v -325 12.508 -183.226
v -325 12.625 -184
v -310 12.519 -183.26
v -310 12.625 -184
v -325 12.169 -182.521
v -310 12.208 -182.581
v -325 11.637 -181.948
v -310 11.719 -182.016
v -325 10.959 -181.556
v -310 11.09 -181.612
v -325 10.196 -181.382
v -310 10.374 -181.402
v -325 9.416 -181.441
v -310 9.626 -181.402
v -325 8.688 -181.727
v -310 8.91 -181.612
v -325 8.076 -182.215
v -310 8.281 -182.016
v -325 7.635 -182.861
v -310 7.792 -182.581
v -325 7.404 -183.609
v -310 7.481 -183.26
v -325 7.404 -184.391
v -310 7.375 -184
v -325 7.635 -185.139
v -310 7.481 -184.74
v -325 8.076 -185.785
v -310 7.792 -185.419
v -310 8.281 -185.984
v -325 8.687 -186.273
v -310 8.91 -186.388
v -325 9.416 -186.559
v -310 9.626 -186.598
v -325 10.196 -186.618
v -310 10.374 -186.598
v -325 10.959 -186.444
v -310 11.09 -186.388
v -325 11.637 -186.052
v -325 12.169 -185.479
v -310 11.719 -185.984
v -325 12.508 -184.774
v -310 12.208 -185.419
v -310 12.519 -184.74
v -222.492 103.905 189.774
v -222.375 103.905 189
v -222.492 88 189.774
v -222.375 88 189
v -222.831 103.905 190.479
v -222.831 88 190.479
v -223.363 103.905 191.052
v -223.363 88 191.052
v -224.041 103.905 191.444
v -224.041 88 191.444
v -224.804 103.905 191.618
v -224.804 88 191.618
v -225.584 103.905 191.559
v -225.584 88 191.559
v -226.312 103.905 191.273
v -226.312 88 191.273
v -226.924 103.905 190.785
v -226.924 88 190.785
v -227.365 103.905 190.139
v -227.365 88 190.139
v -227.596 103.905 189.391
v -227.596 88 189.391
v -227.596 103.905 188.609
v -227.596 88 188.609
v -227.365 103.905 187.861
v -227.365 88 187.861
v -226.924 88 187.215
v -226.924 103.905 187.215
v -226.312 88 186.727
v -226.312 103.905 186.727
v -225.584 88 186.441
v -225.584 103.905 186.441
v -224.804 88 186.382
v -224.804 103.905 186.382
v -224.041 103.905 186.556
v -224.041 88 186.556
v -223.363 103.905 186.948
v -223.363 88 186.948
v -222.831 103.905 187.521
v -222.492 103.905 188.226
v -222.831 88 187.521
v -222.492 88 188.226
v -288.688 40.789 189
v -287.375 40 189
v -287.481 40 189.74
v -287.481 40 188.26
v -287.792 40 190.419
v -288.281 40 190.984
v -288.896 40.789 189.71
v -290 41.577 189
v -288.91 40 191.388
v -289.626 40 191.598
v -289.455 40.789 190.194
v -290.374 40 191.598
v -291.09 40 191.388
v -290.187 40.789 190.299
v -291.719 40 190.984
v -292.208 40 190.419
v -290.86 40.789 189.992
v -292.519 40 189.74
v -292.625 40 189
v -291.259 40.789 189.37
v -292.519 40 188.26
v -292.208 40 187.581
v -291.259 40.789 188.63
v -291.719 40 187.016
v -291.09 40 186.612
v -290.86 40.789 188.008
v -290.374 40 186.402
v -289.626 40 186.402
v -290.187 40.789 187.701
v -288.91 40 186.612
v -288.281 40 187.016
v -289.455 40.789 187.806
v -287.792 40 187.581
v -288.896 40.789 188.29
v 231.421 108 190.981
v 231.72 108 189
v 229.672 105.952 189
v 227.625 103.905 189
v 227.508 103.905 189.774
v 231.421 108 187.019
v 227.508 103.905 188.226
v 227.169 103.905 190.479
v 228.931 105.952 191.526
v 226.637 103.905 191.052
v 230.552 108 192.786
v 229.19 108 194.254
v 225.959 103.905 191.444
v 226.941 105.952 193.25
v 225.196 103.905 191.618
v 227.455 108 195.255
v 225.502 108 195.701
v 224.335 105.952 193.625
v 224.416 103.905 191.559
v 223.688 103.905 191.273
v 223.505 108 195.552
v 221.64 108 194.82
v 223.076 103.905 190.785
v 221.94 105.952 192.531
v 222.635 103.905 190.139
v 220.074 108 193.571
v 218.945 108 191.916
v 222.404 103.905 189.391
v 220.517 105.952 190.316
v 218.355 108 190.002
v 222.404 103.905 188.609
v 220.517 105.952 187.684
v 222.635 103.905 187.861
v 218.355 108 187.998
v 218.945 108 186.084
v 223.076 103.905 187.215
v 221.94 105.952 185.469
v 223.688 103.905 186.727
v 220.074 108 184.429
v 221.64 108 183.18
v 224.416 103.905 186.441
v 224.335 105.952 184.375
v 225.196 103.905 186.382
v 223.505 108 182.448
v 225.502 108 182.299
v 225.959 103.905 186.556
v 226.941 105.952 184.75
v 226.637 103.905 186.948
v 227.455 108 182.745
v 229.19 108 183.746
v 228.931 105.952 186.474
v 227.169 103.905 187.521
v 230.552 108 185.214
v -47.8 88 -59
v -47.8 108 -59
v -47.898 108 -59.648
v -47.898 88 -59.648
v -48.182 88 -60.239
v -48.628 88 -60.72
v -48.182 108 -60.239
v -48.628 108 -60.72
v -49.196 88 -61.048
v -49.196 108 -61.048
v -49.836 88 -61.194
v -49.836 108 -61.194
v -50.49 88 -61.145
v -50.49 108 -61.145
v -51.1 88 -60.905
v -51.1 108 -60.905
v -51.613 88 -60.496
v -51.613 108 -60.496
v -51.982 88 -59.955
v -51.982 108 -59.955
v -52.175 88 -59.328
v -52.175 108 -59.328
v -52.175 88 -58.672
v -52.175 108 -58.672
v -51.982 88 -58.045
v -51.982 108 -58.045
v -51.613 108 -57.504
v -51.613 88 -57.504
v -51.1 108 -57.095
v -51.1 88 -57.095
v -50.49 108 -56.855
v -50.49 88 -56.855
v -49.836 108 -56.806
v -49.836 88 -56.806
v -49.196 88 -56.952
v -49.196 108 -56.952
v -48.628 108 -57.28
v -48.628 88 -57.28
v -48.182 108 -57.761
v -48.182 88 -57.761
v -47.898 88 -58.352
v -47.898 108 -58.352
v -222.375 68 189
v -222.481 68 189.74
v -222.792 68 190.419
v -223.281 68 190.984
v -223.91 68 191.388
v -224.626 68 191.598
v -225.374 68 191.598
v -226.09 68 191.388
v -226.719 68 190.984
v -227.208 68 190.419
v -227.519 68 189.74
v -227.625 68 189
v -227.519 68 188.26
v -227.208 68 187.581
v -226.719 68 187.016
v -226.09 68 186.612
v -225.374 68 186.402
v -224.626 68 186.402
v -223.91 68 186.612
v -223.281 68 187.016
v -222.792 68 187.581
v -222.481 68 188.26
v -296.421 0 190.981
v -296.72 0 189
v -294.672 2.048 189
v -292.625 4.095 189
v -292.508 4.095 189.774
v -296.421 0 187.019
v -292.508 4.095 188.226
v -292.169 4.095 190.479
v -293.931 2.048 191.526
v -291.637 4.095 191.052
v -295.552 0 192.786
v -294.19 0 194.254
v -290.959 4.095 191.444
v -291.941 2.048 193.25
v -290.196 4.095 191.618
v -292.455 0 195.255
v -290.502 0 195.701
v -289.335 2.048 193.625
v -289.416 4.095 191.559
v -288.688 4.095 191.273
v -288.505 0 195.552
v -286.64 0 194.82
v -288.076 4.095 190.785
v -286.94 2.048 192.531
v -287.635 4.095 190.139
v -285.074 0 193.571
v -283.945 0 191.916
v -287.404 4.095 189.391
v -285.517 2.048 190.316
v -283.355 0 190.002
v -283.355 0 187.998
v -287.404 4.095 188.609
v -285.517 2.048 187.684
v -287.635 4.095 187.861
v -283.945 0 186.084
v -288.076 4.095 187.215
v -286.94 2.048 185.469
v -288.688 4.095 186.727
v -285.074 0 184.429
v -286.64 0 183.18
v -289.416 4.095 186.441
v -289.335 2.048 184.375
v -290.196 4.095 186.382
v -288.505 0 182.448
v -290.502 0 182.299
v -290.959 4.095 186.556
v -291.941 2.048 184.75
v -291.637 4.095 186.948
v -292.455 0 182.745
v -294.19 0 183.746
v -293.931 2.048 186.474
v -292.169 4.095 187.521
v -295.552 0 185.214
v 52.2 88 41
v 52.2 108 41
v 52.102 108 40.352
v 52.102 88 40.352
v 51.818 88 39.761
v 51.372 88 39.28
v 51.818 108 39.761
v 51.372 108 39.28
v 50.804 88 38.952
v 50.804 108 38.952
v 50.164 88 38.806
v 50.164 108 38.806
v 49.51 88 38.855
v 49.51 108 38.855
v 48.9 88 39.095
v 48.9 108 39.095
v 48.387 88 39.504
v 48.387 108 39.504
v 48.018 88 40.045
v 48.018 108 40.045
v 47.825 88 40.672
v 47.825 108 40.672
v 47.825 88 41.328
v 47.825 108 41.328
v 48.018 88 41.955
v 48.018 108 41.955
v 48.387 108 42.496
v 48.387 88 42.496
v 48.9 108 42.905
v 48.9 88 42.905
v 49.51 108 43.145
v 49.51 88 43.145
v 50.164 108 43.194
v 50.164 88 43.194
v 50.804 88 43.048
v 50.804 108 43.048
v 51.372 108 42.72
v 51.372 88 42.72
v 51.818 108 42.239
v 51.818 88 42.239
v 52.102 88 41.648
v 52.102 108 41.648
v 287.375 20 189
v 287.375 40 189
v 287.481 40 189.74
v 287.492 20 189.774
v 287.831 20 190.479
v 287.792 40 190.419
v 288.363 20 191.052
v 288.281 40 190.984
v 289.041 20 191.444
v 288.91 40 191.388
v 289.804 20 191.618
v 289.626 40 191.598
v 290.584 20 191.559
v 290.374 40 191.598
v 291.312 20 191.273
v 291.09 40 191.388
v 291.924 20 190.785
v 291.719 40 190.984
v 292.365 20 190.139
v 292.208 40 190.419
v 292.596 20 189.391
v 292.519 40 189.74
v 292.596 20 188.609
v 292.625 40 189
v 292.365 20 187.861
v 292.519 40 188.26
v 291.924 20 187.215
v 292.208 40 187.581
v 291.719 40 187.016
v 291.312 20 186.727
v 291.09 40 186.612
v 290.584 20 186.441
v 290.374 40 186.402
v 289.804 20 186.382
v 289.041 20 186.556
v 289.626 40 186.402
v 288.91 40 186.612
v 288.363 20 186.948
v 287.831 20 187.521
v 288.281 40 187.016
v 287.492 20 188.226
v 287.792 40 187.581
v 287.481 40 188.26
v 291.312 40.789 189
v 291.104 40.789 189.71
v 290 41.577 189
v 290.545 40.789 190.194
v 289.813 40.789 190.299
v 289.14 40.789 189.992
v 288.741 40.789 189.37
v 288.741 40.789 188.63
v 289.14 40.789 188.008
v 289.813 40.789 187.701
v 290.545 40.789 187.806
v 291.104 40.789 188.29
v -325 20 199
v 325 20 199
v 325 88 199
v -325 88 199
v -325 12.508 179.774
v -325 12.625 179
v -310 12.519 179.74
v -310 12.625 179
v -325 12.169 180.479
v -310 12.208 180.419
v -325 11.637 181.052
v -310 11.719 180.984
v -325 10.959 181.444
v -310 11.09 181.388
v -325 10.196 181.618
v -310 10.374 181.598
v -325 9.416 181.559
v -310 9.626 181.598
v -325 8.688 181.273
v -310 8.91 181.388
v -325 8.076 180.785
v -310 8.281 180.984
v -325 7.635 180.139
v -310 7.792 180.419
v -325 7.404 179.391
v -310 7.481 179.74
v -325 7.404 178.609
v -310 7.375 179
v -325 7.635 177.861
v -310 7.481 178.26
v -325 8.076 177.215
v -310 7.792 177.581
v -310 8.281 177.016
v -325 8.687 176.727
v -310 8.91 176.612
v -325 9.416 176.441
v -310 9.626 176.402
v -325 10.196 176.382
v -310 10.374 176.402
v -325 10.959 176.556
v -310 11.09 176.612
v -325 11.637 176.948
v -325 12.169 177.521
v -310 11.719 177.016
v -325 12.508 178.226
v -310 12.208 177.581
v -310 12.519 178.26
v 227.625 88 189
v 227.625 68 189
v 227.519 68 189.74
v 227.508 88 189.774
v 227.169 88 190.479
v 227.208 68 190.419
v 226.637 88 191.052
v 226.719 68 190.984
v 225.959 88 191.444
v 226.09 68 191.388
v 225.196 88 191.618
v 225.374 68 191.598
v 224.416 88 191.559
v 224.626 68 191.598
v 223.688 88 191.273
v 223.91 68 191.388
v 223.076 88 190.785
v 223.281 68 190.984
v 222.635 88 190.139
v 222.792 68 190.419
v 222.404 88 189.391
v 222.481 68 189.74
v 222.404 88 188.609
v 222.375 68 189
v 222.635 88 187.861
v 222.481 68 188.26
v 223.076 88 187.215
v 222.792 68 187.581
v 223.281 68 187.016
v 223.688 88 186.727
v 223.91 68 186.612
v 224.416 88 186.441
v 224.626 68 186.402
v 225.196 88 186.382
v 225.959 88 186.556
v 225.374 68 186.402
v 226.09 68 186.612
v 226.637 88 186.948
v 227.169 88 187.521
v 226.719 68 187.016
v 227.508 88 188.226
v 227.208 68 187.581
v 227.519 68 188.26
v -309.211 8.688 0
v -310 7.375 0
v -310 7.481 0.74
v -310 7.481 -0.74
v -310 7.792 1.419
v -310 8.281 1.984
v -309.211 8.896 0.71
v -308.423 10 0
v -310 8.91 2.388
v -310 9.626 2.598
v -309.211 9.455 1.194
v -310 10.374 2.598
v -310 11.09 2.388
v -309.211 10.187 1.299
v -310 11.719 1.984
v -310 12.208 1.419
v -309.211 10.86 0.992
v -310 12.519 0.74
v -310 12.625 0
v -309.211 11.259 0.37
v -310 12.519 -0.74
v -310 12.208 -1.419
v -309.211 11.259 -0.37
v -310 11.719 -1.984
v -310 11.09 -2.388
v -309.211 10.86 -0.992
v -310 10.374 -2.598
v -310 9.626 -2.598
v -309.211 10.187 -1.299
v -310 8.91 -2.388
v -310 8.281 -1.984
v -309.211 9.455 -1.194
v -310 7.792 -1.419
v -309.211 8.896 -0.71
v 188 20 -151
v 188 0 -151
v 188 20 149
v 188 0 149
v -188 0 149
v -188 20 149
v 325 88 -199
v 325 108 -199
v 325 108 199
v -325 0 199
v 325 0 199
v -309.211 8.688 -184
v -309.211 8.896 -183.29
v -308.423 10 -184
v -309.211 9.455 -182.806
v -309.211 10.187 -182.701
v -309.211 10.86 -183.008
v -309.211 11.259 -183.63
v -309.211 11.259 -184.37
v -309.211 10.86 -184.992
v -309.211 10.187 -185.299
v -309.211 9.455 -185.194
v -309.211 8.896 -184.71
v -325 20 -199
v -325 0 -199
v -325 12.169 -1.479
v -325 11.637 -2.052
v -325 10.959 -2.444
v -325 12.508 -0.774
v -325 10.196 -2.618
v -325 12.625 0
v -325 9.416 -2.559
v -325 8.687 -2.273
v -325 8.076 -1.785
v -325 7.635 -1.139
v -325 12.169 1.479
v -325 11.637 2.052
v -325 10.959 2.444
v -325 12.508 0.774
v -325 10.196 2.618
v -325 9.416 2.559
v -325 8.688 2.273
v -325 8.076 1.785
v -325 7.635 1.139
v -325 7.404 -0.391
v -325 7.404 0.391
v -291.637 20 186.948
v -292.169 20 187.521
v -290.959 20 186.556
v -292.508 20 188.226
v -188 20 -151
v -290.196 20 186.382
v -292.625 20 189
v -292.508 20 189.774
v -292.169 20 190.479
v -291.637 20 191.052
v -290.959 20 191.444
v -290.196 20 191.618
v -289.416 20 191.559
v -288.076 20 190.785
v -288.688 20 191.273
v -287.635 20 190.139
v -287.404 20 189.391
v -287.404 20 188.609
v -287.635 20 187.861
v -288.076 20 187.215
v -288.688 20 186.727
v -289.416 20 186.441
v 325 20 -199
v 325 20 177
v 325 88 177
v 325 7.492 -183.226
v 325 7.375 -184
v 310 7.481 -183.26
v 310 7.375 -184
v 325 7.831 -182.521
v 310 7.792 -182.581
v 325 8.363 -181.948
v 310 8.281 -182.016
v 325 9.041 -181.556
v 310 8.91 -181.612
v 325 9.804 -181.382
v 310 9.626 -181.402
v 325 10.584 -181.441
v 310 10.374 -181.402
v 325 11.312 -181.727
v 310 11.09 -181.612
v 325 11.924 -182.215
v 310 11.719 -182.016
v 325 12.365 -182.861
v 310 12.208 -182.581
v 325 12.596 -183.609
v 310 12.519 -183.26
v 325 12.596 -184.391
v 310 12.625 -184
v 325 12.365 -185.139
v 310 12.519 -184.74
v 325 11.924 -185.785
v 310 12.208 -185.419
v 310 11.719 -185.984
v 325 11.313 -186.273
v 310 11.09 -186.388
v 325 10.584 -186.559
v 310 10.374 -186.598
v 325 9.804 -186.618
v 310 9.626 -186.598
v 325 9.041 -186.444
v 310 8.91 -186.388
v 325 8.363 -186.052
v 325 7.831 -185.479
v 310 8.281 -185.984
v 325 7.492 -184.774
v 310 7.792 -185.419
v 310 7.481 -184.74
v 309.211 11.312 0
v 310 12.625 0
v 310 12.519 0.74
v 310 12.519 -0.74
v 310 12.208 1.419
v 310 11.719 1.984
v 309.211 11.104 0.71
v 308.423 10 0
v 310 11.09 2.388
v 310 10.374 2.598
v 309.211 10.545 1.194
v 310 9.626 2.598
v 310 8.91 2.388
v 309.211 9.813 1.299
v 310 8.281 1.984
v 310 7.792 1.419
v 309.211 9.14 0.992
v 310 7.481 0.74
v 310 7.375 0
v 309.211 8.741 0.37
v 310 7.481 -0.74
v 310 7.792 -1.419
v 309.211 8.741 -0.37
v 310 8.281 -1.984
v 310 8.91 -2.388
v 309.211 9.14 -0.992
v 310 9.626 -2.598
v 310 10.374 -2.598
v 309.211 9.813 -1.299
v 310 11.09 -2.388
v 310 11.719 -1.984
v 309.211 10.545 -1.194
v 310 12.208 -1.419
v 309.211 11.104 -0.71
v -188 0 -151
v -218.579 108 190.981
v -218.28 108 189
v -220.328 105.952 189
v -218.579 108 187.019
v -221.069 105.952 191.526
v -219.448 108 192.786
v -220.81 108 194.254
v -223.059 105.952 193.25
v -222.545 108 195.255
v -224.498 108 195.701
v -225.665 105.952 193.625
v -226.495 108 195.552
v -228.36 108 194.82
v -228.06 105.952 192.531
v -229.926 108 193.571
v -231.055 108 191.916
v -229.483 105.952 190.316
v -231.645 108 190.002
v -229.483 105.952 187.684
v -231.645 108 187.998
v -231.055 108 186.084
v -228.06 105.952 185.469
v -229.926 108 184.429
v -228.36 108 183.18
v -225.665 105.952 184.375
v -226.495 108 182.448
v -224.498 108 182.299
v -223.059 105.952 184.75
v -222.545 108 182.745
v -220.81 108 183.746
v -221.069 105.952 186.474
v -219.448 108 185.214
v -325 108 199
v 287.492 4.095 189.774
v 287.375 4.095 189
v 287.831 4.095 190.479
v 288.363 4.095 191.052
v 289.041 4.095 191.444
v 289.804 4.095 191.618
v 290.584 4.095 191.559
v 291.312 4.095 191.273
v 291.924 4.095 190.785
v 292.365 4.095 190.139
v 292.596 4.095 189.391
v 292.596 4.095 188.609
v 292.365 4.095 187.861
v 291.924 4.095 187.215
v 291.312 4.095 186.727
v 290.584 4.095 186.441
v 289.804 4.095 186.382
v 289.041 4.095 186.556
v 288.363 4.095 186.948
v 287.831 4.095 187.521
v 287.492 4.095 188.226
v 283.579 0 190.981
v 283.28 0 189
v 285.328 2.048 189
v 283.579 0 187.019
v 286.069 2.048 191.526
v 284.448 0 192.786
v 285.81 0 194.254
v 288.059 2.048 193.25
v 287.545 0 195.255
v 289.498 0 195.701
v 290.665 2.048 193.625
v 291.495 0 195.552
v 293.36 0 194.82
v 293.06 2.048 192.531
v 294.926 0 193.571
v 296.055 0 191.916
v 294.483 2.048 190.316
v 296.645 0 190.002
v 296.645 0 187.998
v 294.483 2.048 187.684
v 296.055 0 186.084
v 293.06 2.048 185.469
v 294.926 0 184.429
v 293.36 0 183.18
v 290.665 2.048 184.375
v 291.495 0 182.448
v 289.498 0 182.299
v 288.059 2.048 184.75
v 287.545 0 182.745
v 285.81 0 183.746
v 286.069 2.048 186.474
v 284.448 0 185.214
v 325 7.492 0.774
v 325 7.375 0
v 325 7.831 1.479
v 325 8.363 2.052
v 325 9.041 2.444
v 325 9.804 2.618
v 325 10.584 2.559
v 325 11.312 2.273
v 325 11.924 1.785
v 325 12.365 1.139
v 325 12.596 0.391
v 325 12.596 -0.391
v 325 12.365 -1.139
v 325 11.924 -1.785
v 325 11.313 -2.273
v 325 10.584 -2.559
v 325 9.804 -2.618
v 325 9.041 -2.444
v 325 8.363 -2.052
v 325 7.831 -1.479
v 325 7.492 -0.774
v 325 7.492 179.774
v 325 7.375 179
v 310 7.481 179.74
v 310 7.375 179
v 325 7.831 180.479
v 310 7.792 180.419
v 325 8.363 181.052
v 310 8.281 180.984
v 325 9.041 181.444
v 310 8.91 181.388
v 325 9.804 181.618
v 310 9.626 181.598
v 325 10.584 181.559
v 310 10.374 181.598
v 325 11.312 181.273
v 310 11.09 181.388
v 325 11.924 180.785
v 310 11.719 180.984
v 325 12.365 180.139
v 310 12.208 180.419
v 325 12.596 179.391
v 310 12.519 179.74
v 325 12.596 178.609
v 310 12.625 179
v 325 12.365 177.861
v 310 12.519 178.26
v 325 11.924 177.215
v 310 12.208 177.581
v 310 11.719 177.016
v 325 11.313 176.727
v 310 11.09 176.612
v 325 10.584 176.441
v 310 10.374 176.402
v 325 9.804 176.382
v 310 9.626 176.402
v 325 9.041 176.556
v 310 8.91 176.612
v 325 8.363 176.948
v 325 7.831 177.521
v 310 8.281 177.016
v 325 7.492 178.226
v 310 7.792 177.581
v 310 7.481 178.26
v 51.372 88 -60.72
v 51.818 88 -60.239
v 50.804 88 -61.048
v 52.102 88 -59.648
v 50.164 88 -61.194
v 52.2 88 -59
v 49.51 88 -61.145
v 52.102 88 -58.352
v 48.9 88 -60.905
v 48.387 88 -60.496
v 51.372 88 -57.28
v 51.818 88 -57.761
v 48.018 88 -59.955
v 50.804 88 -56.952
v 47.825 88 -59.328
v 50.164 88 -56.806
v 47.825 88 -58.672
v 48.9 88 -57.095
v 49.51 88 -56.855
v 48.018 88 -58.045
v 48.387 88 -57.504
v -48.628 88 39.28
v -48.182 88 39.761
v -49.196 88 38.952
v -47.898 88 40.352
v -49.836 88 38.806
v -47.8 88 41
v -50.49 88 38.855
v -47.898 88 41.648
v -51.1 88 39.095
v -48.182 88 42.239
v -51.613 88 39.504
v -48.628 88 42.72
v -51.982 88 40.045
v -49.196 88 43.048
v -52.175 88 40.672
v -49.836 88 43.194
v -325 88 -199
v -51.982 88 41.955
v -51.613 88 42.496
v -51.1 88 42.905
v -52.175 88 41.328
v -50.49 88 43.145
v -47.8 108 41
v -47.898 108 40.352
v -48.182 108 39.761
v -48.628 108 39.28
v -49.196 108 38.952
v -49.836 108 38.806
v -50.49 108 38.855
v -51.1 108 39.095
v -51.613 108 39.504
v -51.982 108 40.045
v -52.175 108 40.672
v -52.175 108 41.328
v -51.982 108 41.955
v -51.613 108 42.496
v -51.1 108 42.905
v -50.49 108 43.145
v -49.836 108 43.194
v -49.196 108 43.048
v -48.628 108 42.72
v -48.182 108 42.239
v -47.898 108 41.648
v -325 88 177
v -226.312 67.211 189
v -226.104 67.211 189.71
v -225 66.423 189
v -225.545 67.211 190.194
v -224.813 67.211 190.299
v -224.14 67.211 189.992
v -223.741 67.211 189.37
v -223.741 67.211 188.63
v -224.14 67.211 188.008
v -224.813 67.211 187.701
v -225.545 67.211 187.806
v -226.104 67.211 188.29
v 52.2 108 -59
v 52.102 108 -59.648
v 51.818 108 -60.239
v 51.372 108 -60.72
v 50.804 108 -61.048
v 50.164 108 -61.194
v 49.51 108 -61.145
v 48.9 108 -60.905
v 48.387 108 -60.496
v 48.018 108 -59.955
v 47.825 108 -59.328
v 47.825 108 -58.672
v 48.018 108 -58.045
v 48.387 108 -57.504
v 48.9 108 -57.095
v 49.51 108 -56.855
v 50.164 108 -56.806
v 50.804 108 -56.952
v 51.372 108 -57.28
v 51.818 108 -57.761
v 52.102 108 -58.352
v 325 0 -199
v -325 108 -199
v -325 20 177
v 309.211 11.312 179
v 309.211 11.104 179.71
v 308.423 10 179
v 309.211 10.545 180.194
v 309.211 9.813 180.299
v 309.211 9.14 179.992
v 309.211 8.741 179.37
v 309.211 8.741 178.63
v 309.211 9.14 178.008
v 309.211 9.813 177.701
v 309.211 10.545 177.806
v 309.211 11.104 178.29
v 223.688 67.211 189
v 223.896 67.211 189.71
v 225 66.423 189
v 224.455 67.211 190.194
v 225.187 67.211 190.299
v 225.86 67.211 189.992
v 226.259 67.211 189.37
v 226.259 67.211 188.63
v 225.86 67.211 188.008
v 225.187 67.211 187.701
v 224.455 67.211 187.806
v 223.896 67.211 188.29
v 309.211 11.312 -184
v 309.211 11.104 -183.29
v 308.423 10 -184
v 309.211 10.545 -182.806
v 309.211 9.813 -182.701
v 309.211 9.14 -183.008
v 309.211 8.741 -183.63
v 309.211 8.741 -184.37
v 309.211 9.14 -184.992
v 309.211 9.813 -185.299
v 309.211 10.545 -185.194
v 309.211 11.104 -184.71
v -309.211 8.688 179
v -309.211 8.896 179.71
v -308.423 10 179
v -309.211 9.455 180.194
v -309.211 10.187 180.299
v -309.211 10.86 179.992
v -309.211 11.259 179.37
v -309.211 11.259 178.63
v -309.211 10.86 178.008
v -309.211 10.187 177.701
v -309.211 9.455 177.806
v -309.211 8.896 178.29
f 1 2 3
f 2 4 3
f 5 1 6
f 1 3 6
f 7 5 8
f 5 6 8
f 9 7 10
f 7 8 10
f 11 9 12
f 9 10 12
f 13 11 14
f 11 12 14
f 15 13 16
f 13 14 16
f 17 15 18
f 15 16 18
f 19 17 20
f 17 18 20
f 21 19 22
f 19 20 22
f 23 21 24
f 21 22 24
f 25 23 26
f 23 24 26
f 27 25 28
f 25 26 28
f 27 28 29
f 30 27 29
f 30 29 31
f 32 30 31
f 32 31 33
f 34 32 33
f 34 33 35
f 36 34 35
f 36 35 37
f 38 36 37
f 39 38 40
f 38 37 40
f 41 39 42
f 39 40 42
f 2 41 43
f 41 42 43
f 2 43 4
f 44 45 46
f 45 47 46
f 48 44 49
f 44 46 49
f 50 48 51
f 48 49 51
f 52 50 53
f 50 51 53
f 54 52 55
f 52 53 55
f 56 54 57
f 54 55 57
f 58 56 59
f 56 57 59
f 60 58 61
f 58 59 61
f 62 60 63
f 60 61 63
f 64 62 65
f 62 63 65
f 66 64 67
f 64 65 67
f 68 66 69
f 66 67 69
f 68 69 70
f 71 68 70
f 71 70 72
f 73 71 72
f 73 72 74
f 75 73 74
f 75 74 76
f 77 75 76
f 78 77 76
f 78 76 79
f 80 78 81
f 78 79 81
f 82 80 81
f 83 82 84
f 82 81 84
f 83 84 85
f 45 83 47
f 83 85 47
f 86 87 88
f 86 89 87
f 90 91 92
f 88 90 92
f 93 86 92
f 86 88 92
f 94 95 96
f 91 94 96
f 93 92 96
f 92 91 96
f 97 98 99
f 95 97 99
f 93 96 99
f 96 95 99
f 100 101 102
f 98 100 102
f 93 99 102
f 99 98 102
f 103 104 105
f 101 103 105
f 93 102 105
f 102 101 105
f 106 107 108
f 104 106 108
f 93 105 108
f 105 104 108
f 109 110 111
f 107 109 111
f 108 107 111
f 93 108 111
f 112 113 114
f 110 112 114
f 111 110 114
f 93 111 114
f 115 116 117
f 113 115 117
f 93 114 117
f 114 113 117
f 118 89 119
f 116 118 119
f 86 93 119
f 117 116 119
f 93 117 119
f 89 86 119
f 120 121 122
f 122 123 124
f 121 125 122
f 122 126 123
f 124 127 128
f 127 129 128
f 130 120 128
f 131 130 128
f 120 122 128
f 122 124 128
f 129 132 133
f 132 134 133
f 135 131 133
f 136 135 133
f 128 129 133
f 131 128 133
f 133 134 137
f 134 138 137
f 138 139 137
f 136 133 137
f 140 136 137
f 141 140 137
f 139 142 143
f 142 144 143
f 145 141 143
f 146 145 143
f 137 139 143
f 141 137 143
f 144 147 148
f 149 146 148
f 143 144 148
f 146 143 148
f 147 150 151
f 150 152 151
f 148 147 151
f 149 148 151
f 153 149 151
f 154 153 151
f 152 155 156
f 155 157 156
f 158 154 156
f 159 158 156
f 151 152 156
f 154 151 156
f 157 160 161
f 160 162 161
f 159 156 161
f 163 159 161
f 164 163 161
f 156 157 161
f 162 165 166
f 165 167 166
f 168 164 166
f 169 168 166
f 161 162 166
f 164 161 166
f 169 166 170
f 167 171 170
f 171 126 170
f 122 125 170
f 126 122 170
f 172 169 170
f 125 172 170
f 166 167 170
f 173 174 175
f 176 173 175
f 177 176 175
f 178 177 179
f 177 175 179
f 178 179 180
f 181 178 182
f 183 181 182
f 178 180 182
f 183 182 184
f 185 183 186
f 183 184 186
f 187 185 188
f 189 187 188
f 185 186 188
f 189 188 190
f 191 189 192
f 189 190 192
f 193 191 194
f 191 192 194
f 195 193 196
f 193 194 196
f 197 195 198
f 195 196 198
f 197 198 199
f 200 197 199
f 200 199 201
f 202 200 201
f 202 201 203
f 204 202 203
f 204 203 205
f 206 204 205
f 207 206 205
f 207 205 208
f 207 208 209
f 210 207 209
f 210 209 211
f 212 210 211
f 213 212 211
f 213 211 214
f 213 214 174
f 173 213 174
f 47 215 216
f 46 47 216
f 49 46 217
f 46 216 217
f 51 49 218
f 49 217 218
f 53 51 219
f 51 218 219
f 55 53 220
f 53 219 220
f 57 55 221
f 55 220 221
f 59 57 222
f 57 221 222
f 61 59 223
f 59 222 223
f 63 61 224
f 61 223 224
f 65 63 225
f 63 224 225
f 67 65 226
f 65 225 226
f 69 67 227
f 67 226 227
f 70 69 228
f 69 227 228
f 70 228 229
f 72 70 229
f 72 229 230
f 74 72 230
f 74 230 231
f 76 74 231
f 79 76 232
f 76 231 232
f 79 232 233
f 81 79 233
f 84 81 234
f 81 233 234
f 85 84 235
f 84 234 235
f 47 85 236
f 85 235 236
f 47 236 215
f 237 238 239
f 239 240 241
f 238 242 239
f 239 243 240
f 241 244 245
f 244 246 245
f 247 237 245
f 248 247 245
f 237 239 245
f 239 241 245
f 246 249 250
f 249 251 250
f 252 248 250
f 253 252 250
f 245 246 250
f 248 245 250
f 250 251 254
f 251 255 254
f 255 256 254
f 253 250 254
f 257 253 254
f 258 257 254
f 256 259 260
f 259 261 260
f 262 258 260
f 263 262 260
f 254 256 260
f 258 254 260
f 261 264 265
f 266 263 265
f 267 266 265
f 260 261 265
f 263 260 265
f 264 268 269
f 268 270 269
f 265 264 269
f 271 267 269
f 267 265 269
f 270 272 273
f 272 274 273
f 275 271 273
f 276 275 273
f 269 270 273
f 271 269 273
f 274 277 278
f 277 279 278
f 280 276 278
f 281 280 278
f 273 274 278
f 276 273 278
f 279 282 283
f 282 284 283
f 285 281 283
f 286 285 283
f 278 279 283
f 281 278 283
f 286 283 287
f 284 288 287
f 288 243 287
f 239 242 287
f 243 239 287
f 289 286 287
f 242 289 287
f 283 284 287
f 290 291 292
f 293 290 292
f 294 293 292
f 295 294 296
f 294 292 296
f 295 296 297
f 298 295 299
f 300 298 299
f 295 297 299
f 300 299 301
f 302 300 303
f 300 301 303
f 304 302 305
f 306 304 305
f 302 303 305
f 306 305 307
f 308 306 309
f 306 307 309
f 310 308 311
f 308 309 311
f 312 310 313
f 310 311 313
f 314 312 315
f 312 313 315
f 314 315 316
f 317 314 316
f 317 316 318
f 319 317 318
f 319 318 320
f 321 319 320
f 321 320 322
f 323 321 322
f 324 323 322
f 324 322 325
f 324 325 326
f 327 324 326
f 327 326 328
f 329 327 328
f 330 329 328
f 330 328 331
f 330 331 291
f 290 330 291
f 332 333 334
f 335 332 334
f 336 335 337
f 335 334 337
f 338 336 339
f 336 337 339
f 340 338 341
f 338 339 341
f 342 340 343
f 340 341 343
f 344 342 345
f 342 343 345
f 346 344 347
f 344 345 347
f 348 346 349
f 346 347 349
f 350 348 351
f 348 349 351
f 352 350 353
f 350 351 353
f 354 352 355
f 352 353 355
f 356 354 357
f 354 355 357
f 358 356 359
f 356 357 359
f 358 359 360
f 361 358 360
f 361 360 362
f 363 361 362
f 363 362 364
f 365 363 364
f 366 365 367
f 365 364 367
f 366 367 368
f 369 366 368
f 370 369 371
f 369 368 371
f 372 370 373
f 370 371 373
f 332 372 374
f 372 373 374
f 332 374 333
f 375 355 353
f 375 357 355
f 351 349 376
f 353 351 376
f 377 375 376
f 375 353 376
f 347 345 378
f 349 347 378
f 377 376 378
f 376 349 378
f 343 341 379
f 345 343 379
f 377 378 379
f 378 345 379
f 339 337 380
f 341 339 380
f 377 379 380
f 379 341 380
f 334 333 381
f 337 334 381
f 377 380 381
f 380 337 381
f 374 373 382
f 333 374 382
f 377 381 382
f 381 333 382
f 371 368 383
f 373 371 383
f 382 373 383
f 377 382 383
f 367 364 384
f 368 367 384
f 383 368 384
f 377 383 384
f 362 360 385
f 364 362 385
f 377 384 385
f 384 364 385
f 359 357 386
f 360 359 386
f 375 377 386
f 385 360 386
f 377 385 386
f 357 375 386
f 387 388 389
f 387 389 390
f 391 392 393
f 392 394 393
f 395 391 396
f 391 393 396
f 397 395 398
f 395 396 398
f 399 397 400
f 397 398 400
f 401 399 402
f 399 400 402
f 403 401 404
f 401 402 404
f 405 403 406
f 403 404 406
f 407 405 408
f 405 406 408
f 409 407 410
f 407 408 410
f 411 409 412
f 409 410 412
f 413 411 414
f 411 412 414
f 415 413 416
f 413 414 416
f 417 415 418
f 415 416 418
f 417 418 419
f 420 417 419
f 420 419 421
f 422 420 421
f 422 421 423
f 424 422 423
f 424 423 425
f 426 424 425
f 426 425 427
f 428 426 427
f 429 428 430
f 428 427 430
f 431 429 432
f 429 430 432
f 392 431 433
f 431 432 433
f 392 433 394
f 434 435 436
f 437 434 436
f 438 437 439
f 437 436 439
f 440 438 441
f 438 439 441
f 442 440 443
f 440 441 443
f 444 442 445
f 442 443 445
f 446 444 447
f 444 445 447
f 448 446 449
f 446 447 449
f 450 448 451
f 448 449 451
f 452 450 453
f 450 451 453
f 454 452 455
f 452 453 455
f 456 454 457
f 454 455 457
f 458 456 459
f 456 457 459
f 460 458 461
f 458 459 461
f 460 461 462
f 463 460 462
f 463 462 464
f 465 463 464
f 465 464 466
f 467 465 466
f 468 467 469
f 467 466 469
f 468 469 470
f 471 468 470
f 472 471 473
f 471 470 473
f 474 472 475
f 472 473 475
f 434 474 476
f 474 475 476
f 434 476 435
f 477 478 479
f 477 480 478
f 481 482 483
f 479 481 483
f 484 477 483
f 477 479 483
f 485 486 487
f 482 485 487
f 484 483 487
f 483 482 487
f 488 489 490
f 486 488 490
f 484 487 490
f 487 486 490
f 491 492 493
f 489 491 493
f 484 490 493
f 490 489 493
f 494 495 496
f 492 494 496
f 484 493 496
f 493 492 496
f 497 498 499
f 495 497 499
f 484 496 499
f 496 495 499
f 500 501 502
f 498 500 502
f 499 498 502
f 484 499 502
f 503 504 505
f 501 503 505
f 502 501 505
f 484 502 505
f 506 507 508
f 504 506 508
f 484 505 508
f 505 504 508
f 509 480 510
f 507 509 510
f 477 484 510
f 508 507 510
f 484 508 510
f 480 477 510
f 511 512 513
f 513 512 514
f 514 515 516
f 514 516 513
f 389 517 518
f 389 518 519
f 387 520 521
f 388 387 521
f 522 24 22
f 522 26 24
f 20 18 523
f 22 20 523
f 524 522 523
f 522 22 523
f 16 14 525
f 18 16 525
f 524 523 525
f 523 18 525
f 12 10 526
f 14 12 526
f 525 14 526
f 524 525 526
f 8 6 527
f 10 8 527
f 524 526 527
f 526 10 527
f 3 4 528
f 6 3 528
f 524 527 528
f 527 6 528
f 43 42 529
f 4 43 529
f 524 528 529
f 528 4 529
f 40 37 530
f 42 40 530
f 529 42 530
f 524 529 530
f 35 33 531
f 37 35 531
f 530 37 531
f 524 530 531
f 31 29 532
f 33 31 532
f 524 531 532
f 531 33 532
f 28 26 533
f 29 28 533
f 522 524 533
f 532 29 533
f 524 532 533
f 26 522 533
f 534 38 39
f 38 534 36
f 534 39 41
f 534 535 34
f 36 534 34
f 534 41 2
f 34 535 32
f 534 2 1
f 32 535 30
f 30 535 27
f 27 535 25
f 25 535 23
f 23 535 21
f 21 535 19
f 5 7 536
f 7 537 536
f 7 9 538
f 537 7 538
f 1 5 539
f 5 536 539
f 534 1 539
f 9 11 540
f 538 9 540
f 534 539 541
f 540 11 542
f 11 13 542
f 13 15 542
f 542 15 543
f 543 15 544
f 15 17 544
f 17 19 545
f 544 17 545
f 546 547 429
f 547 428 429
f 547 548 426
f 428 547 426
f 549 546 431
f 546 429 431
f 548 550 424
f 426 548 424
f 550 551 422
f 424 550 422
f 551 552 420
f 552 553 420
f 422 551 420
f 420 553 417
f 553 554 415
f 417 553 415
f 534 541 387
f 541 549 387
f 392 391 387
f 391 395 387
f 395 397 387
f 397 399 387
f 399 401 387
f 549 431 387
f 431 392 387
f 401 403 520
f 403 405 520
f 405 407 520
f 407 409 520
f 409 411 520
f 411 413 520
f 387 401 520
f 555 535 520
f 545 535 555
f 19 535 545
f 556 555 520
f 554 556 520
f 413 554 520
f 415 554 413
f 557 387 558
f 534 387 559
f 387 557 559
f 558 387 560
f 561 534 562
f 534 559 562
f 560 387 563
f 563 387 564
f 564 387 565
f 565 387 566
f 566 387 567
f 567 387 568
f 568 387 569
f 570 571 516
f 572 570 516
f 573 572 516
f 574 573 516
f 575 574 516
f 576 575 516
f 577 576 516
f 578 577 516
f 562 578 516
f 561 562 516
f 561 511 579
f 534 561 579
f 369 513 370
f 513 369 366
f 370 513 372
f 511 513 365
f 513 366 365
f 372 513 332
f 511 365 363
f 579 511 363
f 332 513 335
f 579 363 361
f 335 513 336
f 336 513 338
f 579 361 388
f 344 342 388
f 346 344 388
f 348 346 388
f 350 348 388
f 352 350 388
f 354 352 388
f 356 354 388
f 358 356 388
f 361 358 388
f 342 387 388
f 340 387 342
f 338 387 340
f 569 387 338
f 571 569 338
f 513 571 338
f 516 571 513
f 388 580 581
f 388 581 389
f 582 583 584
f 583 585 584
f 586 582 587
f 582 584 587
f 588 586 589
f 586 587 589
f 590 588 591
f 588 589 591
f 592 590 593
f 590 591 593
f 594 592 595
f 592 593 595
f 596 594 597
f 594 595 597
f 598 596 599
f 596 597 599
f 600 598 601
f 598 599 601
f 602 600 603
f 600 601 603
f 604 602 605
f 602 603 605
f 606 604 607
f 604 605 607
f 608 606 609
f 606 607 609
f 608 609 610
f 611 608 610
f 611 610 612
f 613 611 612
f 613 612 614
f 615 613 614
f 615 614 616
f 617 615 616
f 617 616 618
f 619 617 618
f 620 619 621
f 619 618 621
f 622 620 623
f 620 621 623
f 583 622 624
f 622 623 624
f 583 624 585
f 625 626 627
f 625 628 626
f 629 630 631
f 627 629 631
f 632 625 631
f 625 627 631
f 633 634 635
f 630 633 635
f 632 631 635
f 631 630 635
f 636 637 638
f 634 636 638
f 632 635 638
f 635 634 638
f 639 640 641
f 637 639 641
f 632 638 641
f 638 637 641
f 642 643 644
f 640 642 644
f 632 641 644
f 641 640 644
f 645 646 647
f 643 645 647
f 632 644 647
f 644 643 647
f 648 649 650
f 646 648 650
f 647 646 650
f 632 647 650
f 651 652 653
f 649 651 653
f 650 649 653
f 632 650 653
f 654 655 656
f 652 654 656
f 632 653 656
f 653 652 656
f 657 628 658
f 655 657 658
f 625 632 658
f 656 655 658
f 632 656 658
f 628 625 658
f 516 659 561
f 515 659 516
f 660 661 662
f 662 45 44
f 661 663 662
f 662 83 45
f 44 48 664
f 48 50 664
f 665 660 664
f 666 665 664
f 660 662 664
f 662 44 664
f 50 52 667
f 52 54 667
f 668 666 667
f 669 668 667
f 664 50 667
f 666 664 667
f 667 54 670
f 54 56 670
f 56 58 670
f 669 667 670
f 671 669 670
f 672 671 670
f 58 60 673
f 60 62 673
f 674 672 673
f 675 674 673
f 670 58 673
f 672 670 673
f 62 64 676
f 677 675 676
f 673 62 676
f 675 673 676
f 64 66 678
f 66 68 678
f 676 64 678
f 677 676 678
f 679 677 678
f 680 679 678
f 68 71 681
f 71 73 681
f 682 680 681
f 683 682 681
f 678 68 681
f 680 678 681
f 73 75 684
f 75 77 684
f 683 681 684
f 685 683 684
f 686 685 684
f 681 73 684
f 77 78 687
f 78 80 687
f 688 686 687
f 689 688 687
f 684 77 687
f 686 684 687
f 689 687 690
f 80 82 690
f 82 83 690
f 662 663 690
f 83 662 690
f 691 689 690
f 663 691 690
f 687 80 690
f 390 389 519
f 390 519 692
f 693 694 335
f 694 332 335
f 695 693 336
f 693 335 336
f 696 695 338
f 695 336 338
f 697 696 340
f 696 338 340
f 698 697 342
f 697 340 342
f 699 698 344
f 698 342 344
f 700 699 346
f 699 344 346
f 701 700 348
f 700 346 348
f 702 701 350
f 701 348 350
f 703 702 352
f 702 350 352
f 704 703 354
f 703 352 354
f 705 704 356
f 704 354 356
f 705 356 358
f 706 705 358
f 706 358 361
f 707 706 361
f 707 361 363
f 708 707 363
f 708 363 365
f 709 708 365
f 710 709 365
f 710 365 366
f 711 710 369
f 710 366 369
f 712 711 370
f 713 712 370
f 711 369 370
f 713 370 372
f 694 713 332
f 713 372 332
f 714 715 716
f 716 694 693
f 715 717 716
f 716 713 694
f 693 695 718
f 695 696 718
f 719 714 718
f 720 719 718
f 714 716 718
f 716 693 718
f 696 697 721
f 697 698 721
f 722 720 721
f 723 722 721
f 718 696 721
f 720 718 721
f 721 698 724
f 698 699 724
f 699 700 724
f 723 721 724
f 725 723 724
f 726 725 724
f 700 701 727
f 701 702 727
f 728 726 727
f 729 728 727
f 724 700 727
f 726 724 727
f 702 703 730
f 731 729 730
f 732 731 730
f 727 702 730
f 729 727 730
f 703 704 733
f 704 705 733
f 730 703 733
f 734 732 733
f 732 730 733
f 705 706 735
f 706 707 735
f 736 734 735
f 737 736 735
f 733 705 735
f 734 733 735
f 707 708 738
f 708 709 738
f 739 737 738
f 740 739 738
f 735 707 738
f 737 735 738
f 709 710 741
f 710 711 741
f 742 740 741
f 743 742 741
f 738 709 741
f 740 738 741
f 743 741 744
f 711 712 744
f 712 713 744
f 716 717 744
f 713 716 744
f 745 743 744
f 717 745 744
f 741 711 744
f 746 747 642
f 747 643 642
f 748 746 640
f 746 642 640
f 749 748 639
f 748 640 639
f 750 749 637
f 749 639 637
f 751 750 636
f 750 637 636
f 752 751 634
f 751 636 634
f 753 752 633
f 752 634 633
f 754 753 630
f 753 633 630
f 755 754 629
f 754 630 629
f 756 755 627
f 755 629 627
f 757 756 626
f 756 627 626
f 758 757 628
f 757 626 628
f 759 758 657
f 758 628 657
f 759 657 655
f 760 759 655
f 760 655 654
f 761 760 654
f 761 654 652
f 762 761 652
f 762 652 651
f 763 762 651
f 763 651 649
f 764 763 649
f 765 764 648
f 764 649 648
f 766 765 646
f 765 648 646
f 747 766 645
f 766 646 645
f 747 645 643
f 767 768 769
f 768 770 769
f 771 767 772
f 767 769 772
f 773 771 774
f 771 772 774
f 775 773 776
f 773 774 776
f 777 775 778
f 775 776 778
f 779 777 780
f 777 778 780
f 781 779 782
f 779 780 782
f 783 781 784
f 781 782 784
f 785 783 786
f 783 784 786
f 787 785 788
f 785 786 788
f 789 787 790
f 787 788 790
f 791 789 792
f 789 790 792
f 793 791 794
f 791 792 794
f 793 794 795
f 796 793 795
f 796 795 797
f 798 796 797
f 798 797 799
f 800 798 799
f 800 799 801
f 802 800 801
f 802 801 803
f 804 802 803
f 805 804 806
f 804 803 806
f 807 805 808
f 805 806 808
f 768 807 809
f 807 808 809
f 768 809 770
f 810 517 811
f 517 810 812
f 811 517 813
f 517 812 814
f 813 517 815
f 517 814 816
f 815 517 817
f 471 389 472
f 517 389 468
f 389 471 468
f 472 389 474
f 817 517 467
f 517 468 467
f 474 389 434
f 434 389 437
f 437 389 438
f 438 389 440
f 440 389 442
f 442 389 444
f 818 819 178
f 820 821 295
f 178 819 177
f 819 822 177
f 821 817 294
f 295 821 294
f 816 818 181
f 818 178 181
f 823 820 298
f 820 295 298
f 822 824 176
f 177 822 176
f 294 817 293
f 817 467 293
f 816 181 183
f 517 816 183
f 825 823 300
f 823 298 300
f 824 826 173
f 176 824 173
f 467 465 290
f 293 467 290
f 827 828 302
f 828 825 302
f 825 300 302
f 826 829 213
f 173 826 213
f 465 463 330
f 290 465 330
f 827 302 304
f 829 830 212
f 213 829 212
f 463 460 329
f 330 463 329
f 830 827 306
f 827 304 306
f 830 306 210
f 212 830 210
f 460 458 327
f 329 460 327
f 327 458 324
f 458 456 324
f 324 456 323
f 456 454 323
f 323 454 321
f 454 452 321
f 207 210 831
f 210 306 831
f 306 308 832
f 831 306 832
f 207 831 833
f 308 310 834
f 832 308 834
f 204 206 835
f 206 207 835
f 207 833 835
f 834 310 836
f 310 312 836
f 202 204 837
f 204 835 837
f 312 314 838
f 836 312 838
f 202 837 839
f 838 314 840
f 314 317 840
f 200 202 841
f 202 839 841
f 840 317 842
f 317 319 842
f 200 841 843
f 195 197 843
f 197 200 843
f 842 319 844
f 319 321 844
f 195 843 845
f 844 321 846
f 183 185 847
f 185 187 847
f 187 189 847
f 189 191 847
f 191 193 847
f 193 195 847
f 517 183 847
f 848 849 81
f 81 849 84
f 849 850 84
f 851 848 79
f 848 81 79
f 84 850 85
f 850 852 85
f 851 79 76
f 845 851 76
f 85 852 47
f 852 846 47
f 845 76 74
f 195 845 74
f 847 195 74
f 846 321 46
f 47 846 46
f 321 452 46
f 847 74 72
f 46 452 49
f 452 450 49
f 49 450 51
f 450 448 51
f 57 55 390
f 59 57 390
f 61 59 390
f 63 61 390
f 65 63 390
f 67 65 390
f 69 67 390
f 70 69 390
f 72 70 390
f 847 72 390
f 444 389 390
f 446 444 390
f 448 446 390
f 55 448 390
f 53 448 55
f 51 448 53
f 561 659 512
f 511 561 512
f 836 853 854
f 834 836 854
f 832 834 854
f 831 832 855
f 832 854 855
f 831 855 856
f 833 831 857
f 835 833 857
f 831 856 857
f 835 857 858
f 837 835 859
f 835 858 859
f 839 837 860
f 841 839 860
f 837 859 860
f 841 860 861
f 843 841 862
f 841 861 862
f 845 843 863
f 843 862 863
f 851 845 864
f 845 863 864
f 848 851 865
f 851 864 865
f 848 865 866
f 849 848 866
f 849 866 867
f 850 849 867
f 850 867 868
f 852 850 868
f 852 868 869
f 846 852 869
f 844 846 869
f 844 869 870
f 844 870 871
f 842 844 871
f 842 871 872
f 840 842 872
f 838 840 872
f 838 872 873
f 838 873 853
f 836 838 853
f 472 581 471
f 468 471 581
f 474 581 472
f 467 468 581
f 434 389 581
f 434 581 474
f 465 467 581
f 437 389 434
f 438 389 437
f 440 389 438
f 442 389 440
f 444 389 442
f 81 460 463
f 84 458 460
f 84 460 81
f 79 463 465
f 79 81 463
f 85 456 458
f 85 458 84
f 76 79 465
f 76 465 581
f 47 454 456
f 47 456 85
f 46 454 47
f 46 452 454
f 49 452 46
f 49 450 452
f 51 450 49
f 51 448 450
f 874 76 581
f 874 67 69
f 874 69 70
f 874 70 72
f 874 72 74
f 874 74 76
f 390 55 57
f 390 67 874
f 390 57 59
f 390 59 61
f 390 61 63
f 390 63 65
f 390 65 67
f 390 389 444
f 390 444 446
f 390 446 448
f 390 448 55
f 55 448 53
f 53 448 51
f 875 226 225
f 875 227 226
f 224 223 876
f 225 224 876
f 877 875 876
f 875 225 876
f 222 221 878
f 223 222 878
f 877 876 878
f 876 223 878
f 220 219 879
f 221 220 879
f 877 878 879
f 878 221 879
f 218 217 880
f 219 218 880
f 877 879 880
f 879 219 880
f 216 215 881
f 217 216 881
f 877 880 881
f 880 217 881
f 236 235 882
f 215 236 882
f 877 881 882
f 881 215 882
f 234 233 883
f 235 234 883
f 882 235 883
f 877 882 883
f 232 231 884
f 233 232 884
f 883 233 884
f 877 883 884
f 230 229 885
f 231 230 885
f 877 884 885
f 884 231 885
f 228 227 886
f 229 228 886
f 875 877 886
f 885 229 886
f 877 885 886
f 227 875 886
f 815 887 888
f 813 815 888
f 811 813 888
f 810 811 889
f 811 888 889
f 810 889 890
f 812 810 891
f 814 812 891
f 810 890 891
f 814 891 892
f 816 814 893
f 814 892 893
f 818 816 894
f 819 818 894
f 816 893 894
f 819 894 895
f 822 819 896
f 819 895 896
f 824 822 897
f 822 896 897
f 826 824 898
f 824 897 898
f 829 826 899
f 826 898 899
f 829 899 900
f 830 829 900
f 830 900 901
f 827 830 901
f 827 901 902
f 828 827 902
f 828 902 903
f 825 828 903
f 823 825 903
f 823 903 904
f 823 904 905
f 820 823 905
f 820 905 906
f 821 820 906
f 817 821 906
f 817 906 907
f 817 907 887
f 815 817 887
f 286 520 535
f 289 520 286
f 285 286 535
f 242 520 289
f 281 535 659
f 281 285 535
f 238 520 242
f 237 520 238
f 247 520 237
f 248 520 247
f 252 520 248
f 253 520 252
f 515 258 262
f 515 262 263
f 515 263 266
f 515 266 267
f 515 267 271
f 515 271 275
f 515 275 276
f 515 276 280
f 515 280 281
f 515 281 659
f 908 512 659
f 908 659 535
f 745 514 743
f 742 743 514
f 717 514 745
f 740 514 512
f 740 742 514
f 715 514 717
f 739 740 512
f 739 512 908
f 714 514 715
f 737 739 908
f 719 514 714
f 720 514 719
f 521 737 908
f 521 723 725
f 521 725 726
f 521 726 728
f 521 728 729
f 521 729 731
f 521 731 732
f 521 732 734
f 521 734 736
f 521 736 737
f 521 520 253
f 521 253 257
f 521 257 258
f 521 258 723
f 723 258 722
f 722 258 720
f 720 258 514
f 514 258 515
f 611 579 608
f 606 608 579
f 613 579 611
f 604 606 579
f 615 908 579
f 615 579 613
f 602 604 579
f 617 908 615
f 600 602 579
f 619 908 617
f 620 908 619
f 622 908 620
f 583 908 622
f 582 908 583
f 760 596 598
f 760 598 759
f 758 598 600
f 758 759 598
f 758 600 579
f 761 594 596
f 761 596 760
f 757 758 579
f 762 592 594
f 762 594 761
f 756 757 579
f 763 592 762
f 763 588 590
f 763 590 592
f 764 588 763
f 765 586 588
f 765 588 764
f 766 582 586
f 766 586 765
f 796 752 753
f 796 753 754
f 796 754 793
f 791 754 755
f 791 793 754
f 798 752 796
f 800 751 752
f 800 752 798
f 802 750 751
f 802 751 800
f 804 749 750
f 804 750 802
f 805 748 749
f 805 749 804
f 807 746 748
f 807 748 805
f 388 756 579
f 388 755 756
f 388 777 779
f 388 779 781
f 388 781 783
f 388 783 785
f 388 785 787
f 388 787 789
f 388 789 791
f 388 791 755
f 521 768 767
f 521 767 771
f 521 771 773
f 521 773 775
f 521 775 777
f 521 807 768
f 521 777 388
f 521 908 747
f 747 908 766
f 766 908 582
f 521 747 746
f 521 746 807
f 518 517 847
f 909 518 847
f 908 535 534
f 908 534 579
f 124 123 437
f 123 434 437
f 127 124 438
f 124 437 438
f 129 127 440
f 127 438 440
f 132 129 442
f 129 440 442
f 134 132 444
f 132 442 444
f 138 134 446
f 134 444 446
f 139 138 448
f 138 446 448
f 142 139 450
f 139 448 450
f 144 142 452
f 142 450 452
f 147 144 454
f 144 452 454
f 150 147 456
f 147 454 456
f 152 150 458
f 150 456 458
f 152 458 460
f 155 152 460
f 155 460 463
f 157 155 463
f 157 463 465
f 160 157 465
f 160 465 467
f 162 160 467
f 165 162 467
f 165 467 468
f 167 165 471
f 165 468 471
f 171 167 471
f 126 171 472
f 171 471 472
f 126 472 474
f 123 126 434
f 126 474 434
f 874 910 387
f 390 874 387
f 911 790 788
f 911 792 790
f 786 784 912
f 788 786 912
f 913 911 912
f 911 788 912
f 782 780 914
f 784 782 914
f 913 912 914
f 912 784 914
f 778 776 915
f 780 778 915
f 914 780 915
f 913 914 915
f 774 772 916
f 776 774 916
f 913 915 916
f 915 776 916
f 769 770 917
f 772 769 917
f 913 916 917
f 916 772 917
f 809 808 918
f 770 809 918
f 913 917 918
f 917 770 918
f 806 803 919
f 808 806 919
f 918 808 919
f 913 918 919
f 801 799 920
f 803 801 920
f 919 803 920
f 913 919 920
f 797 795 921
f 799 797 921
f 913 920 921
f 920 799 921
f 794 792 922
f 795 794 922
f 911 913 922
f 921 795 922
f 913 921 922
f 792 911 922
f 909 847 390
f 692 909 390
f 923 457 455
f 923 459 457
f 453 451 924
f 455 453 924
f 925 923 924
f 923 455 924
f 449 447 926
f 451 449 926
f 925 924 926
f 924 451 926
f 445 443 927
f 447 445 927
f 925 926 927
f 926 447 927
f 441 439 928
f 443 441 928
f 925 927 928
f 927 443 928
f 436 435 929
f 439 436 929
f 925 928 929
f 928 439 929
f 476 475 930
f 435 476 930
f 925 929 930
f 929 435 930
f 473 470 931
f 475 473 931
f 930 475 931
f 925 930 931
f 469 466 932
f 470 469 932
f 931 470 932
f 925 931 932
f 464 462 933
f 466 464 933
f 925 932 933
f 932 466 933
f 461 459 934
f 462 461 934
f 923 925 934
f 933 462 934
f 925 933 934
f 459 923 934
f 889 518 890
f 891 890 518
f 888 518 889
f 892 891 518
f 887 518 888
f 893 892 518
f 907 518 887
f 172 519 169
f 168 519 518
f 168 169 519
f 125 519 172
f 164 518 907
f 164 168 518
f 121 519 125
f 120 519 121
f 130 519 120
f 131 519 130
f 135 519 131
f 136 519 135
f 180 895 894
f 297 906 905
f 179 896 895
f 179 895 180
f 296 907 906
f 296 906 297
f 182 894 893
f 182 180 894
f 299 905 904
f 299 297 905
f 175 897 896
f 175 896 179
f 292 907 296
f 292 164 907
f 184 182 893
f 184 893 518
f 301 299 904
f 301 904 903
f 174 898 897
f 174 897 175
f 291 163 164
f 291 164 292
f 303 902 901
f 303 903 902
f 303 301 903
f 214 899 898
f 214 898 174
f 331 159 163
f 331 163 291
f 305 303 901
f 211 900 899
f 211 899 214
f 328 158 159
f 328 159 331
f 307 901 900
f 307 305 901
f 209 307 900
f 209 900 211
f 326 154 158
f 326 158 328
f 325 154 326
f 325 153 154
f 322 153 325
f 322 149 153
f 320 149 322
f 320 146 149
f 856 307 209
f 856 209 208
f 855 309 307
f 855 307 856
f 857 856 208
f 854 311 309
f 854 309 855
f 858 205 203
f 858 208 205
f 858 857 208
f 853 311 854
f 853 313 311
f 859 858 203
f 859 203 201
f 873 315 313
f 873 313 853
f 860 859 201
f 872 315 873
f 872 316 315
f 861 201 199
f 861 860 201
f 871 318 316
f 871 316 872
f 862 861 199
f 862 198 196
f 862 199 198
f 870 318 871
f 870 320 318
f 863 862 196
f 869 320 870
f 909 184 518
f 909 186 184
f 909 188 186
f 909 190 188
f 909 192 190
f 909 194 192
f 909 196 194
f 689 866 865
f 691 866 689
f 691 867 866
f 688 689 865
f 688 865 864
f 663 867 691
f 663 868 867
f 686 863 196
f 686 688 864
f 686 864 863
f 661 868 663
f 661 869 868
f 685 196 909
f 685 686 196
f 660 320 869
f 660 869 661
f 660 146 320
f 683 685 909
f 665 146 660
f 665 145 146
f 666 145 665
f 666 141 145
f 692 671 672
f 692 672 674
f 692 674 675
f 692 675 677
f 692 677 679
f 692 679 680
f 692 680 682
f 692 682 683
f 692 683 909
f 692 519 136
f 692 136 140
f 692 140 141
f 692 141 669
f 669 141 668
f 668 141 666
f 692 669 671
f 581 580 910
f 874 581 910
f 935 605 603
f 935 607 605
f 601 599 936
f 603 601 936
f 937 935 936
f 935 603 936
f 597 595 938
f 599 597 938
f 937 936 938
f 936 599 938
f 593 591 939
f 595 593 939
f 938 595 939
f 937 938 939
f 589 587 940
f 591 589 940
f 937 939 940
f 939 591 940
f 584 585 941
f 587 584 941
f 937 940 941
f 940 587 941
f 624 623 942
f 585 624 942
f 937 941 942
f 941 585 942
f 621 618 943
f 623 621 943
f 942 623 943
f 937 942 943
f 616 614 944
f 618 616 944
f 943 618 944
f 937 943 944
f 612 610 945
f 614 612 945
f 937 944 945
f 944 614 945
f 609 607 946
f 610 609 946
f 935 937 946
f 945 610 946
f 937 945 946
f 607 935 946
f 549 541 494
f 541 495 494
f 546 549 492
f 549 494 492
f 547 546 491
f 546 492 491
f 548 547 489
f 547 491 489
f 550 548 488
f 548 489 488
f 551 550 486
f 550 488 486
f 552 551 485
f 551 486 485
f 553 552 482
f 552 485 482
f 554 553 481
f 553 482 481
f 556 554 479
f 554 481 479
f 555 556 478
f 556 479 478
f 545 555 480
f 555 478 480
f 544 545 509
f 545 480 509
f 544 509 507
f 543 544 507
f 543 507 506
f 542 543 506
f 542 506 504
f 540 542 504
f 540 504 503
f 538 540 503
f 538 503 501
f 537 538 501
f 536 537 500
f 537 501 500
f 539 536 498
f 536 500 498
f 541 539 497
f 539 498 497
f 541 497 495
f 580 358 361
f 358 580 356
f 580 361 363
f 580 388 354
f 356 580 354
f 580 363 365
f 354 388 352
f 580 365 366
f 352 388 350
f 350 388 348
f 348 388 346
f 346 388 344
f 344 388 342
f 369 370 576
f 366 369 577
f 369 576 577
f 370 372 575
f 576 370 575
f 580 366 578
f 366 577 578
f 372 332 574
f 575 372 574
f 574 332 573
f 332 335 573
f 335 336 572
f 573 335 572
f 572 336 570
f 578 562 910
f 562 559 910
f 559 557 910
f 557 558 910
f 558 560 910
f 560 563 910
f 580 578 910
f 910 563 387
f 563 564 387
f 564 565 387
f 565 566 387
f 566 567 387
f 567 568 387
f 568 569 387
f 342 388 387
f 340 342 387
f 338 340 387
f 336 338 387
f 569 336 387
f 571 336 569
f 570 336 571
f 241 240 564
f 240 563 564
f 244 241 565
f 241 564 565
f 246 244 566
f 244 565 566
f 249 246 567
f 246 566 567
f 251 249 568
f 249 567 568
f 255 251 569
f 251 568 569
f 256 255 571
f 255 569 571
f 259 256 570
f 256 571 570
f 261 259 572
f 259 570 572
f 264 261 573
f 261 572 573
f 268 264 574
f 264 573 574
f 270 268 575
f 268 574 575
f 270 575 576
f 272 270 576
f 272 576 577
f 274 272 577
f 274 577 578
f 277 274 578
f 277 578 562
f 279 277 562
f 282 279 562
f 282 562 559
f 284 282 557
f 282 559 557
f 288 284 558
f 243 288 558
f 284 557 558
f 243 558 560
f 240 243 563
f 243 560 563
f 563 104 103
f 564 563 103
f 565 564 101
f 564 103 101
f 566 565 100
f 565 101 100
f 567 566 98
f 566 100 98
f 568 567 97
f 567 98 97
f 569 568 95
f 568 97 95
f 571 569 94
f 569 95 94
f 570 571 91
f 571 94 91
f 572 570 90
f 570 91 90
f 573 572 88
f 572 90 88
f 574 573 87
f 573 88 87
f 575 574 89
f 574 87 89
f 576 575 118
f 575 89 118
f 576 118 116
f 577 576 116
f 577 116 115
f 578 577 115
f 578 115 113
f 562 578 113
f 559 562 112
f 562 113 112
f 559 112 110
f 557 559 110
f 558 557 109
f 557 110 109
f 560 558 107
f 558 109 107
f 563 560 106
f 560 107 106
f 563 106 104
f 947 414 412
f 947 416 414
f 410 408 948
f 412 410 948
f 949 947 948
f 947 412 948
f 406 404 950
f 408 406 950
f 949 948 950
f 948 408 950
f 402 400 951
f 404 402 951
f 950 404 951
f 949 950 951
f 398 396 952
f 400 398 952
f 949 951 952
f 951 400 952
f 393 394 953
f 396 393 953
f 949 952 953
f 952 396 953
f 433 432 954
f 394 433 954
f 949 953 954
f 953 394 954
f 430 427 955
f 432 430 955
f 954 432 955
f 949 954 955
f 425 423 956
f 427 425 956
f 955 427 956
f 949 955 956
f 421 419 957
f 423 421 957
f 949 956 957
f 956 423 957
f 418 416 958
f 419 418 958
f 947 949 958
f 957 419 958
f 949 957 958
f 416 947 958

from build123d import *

# Parameters (mm, degrees)
F0_W                    = 650
F0_H                    = 398
F0_W_2                  = 376
F0_H_2                  = 300
F1_DEPTH                = 20
F4_D                    = 5.25
F4_DEPTH                = 15
F4_TIP                  = 1.5772591249
F4_ON_F3_D              = 5.25
F4_ON_F3_DEPTH          = 15
F4_ON_F3_TIP            = 1.5772591249
F5_W                    = 650
F5_H                    = 22
F6_DEPTH                = 68
F7_W                    = 650
F7_H                    = 398
F7_W_2                  = 100
F7_H_2                  = 100
F8_DEPTH                = 20
F10_D                   = 5.25
F10_DEPTH               = 40
F10_CSINK_D             = 13.44
F10_CSINK_ANGLE         = 90
F10_TIP                 = 1.5772591249
F10_2_D                 = 5.25
F10_2_DEPTH             = 40
F10_2_CSINK_D           = 13.44
F10_2_CSINK_ANGLE       = 90
F10_2_TIP               = 1.5772591249
F10_ON_F9_D             = 5.25
F10_ON_F9_DEPTH         = 40
F10_ON_F9_CSINK_D       = 13.44
F10_ON_F9_CSINK_ANGLE   = 90
F10_ON_F9_TIP           = 1.5772591249
F10_ON_F9_2_D           = 5.25
F10_ON_F9_2_DEPTH       = 40
F10_ON_F9_2_CSINK_D     = 13.44
F10_ON_F9_2_CSINK_ANGLE = 90
F10_ON_F9_2_TIP         = 1.5772591249
F11_D                   = 4.4


# Not quite as in the source:
# - a feature names something its author has since deleted; it is built from what else it names


with BuildPart() as f1:
    # F0 (on Front) → F1 (new body)
    with BuildSketch(Plane.XZ):
        Rectangle(F0_W, F0_H)
        with Locations((0, -1)):
            Rectangle(F0_W_2, F0_H_2, mode=Mode.SUBTRACT)
    extrude(amount=-F1_DEPTH)

    # F4
    with Locations(Plane(origin=(-325, 0, 0), x_dir=(0, -1, 0), z_dir=(-1, 0, 0))):
        with Locations((-10, 179), (-10, 0), (-10, -184)):
            Hole(F4_D / 2, depth=F4_DEPTH)
            with Locations((0, 0, -(F4_DEPTH + F4_TIP / 2))):  # 118° drill point
                Cone(0, F4_D / 2, F4_TIP, mode=Mode.SUBTRACT)

    # F4 on F3
    with Locations(Plane.YZ.offset(325)):
        with Locations((10, 179), (10, 0), (10, -184)):
            Hole(F4_ON_F3_D / 2, depth=F4_ON_F3_DEPTH)
            with Locations((0, 0, -(F4_ON_F3_DEPTH + F4_ON_F3_TIP / 2))):  # 118° drill point
                Cone(0, F4_ON_F3_D / 2, F4_ON_F3_TIP, mode=Mode.SUBTRACT)

    # F10
    with Locations(Plane.XZ):
        with Locations((-290, 189), (290, 189)):
            CounterSinkHole(F10_D / 2, F10_CSINK_D / 2, depth=F10_DEPTH, counter_sink_angle=F10_CSINK_ANGLE)
            with Locations((0, 0, -(F10_DEPTH + F10_TIP / 2))):  # 118° drill point
                Cone(0, F10_D / 2, F10_TIP, mode=Mode.SUBTRACT)


with BuildPart() as f6:
    # F5 (on face) → F6 (new body)
    with BuildSketch(Plane(origin=(0, 20, 0), x_dir=(-1, 0, 0), z_dir=(0, 1, 0))):
        with Locations((0, 188)):
            Rectangle(F5_W, F5_H)
    extrude(amount=F6_DEPTH)

    # F10#2
    with Locations(Plane.XZ):
        with Locations((-290, 189), (290, 189)):
            CounterSinkHole(F10_2_D / 2, F10_2_CSINK_D / 2, depth=F10_2_DEPTH, counter_sink_angle=F10_2_CSINK_ANGLE)
            with Locations((0, 0, -(F10_2_DEPTH + F10_2_TIP / 2))):  # 118° drill point
                Cone(0, F10_2_D / 2, F10_2_TIP, mode=Mode.SUBTRACT)

    # F10 on F9
    with Locations(Plane(origin=(0, 108, 0), x_dir=(-1, 0, 0), z_dir=(0, 1, 0))):
        with Locations((-225, 189), (225, 189)):
            CounterSinkHole(F10_ON_F9_D / 2, F10_ON_F9_CSINK_D / 2, depth=F10_ON_F9_DEPTH, counter_sink_angle=F10_ON_F9_CSINK_ANGLE)
            with Locations((0, 0, -(F10_ON_F9_DEPTH + F10_ON_F9_TIP / 2))):  # 118° drill point
                Cone(0, F10_ON_F9_D / 2, F10_ON_F9_TIP, mode=Mode.SUBTRACT)


with BuildPart() as f8:
    # F7 (on face) → F8 (new body)
    with BuildSketch(Plane(origin=(0, 88, 0), x_dir=(-1, 0, 0), z_dir=(0, 1, 0))):
        Rectangle(F7_W, F7_H)
        with Locations((0, -9)):
            Rectangle(F7_W_2, F7_H_2, mode=Mode.SUBTRACT)
        with Locations((0, -9)):
            Rectangle(F7_W_2, F7_H_2)
    extrude(amount=F8_DEPTH)

    # F10 on F9#2
    with Locations(Plane(origin=(0, 108, 0), x_dir=(-1, 0, 0), z_dir=(0, 1, 0))):
        with Locations((-225, 189), (225, 189)):
            CounterSinkHole(F10_ON_F9_2_D / 2, F10_ON_F9_2_CSINK_D / 2, depth=F10_ON_F9_2_DEPTH, counter_sink_angle=F10_ON_F9_2_CSINK_ANGLE)
            with Locations((0, 0, -(F10_ON_F9_2_DEPTH + F10_ON_F9_2_TIP / 2))):  # 118° drill point
                Cone(0, F10_ON_F9_2_D / 2, F10_ON_F9_2_TIP, mode=Mode.SUBTRACT)

    # F11 (through all)
    with Locations(Plane(origin=(0, 88, 0), x_dir=(-1, 0, 0), z_dir=(0, -1, 0))):
        with Locations((-50, -41), (50, -41), (50, 59), (-50, 59)):
            Hole(F11_D / 2)


solid = Compound([f1.part, f6.part, f8.part])
